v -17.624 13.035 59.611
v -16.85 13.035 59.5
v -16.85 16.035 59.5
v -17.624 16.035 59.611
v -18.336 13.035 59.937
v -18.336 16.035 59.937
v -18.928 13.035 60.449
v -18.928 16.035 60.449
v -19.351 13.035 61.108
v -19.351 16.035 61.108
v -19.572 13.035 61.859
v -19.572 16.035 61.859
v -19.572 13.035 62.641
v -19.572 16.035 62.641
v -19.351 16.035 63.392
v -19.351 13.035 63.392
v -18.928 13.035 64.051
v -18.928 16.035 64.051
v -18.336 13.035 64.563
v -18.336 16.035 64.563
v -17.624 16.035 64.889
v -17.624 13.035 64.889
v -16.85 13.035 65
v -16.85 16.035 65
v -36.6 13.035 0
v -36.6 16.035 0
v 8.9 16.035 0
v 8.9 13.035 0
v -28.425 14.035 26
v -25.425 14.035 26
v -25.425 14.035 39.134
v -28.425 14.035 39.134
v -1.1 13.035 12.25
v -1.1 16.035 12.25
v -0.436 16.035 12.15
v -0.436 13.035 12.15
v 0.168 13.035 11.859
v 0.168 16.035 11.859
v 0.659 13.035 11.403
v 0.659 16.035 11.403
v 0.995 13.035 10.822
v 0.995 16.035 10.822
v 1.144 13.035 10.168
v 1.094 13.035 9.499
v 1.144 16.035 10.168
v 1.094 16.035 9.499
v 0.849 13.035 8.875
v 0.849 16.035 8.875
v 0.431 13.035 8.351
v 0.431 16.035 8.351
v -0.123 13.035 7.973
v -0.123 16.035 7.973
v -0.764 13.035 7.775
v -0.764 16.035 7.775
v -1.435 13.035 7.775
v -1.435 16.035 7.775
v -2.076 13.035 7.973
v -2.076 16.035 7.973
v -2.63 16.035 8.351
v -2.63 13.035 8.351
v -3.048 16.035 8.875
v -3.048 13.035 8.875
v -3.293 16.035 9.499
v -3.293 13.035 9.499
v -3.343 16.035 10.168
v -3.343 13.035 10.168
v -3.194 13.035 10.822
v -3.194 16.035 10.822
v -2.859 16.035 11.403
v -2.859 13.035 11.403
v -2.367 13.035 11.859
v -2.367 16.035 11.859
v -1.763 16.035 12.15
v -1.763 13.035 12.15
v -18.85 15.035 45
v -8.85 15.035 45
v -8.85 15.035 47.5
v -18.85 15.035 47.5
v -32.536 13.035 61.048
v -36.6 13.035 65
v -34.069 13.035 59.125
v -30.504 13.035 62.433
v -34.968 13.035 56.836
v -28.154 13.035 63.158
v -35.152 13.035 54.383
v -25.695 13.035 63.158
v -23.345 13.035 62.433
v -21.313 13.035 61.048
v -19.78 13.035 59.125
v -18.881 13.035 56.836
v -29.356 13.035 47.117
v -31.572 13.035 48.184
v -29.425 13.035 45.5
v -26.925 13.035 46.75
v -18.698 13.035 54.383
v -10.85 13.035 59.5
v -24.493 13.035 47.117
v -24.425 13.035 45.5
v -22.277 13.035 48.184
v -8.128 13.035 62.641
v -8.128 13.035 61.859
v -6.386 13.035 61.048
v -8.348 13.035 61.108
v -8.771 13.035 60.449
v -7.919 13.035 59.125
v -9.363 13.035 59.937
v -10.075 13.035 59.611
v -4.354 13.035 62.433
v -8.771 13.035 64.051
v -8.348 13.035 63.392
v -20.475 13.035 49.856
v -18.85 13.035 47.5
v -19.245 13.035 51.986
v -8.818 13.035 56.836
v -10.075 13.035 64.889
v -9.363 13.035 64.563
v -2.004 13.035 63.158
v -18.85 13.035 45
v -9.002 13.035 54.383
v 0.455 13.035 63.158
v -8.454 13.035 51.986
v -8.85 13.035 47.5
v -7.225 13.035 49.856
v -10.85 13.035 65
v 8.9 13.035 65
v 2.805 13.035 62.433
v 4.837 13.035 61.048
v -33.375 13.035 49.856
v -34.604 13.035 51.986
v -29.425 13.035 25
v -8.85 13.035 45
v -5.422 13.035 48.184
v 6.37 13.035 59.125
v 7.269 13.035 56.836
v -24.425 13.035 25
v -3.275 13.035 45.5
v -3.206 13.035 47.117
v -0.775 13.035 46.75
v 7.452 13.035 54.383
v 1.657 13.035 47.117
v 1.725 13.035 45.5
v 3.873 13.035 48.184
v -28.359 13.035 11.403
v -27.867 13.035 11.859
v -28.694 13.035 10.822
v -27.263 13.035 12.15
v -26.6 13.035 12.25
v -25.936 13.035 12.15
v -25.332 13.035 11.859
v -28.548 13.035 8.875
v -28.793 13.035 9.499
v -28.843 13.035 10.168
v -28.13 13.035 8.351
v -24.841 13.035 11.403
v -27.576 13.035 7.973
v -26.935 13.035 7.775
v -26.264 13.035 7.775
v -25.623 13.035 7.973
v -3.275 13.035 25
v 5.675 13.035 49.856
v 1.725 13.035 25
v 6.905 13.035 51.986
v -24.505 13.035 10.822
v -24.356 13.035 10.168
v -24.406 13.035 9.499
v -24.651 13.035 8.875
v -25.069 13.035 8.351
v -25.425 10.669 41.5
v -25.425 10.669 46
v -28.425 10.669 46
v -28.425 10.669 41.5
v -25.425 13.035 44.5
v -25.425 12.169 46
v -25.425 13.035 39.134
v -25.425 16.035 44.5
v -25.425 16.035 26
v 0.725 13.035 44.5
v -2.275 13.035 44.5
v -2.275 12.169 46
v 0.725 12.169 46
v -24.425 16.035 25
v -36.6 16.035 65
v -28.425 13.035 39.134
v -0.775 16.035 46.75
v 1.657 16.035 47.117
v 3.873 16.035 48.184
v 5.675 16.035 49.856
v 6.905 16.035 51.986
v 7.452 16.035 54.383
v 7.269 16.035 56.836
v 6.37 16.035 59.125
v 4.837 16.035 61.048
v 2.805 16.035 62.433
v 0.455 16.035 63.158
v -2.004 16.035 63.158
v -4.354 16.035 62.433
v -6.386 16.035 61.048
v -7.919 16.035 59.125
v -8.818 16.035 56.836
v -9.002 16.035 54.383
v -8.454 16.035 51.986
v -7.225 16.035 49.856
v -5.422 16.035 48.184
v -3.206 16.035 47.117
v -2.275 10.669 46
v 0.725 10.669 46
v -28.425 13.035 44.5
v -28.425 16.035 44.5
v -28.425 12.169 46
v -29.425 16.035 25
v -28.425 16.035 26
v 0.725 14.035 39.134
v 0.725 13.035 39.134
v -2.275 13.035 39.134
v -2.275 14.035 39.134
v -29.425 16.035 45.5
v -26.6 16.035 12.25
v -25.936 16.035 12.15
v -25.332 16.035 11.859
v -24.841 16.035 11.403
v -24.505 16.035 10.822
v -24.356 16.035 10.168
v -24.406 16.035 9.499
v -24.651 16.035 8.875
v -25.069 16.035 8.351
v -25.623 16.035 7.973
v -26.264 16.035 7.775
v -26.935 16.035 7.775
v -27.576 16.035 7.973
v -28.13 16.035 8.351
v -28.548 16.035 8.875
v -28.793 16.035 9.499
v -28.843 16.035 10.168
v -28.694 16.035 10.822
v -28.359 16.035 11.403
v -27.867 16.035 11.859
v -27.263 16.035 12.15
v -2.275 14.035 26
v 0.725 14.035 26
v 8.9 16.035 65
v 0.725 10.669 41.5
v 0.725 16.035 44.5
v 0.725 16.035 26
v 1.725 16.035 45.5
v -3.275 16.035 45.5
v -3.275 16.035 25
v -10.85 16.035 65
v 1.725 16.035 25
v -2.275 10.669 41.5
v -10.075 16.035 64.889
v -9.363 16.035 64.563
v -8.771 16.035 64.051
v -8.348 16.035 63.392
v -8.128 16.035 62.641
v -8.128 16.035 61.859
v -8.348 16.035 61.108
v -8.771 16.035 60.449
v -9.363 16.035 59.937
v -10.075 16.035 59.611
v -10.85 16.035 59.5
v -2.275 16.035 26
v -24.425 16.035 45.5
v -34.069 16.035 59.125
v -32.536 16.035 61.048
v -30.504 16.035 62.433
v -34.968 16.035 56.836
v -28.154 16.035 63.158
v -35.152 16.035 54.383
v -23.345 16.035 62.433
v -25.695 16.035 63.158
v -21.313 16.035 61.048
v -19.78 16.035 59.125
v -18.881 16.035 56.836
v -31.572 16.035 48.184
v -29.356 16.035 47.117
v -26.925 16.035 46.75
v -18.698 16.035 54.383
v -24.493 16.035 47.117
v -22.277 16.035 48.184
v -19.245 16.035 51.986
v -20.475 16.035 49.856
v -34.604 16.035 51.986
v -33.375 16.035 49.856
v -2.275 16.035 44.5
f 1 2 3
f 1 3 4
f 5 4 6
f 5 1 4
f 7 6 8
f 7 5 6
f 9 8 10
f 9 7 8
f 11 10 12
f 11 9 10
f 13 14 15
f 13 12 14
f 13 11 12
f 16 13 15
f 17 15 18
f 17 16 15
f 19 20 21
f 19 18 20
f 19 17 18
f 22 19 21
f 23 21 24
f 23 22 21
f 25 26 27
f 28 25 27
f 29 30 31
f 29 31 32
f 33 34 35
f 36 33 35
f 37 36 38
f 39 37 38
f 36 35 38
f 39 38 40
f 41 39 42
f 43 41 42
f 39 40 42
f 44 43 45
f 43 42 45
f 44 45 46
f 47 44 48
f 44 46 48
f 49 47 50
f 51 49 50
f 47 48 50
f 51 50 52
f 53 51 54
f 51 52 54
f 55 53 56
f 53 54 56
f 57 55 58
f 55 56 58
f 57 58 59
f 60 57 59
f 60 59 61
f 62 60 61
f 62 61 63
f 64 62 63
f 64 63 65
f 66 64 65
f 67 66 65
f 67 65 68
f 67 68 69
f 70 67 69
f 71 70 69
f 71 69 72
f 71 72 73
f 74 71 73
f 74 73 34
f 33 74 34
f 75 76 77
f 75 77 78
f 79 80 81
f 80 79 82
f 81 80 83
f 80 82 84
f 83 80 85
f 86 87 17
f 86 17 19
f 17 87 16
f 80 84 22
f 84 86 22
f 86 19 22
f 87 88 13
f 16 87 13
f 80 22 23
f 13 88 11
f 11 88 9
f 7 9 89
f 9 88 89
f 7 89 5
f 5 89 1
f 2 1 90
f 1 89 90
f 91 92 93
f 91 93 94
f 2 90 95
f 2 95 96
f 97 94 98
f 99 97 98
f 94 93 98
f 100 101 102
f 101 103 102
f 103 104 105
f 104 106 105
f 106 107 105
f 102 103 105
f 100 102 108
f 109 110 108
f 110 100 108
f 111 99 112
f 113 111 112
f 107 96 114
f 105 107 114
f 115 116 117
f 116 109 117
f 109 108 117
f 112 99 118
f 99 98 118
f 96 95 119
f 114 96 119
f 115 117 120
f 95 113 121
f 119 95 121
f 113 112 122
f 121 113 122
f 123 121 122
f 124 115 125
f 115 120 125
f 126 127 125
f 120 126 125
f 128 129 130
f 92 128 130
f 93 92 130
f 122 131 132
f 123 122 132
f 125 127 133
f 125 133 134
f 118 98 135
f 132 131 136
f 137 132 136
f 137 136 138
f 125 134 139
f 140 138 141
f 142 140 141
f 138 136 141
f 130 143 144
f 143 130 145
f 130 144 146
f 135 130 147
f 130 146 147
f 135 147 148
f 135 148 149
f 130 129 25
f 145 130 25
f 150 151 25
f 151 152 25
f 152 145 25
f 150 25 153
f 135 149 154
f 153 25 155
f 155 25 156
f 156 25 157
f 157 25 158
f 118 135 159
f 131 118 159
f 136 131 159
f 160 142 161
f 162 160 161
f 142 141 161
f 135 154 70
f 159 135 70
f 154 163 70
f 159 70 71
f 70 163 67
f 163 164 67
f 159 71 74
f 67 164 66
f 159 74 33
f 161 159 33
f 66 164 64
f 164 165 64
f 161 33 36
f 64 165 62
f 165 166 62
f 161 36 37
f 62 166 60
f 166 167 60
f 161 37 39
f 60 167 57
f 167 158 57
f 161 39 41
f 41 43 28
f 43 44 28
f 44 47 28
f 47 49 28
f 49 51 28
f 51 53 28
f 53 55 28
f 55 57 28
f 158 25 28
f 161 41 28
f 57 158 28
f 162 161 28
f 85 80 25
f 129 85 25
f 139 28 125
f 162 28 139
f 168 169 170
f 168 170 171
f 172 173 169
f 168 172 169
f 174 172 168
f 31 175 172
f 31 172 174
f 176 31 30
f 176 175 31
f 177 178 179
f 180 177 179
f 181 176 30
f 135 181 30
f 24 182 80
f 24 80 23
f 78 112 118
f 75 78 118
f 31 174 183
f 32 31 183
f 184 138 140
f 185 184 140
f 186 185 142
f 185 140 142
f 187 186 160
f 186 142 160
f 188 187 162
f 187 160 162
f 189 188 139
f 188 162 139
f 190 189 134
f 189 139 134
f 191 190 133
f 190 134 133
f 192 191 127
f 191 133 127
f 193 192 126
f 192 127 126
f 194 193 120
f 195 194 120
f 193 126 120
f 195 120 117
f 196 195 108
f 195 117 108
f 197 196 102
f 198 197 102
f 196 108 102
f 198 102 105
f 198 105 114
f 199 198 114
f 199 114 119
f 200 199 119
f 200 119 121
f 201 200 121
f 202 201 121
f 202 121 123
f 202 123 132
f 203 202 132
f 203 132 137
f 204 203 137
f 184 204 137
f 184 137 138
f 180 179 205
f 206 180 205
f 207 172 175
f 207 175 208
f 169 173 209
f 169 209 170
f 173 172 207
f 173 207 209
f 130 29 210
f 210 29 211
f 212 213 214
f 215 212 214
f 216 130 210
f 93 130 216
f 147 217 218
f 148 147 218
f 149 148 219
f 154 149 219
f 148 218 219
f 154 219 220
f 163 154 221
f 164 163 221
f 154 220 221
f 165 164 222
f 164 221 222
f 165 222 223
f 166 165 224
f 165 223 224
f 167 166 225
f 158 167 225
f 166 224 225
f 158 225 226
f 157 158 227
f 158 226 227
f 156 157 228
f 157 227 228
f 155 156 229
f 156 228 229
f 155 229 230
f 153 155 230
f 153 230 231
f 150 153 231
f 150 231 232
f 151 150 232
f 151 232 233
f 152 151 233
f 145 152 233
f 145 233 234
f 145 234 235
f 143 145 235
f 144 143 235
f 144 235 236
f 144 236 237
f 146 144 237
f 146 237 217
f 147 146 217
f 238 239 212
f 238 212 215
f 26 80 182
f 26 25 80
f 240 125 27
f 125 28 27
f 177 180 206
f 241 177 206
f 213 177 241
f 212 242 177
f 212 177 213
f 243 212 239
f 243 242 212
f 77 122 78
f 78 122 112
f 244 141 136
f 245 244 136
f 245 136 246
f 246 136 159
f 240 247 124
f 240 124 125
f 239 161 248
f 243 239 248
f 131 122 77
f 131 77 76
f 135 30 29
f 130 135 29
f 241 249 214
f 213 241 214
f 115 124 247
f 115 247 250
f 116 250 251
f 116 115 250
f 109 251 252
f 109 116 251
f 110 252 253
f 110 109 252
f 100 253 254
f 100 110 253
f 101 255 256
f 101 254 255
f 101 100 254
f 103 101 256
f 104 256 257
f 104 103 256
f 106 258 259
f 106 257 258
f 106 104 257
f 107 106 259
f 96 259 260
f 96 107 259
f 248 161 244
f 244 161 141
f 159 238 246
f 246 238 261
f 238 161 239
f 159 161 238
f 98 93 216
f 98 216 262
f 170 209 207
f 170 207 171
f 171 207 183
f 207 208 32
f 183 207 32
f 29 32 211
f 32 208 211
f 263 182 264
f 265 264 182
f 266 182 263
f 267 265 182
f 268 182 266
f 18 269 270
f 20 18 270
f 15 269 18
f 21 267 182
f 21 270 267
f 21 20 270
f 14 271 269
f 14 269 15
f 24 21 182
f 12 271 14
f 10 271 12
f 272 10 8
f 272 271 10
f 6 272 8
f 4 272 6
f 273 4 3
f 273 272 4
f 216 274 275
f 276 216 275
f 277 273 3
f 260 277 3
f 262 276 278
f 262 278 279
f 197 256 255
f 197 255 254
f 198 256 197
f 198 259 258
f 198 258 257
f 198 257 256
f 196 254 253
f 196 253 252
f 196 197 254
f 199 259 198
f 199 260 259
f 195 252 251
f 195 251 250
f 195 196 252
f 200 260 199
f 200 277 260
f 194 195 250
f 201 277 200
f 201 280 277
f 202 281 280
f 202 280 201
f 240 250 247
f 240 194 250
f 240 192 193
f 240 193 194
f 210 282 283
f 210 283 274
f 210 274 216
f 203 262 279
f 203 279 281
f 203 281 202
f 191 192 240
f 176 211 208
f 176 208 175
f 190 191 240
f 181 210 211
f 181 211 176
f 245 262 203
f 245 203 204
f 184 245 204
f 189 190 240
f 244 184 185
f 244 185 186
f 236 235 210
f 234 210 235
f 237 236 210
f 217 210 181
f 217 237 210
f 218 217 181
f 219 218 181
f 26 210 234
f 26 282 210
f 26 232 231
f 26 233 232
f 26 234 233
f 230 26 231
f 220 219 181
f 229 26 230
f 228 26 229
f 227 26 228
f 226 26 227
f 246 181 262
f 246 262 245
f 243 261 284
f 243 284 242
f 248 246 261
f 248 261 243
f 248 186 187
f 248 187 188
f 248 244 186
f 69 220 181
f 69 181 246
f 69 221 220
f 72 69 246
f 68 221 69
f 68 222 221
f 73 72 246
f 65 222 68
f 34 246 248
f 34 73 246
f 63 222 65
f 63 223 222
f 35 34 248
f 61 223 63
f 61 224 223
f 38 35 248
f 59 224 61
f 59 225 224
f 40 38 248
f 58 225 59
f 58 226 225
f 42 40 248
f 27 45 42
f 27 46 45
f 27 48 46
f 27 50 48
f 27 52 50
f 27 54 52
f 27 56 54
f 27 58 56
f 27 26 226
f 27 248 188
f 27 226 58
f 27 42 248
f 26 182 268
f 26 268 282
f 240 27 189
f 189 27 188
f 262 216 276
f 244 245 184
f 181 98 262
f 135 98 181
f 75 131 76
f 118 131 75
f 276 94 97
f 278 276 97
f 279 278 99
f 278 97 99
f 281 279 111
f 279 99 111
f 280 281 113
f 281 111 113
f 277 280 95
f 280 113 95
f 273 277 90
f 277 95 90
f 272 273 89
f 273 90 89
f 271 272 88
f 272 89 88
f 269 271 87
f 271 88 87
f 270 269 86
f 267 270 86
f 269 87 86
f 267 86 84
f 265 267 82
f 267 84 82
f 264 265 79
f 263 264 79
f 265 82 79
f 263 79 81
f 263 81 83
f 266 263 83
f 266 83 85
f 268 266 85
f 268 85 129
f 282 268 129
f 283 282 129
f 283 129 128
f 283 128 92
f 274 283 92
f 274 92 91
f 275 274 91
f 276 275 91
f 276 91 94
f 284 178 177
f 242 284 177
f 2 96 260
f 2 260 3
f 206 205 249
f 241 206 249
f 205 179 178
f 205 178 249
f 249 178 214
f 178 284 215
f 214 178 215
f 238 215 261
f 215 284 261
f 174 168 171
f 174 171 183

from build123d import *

# Parameters (mm, degrees)
SKETCH1_W           = 45.5
SKETCH1_H           = 3
BOSS_EXTRUDE1_DEPTH = 20
SKETCH2_W           = 45.5
SKETCH2_H           = 3
BOSS_EXTRUDE2_DEPTH = 45
SKETCH3_R           = 8.25
CUT_EXTRUDE1_DEPTH  = 75.656105932
CUT_EXTRUDE2_DEPTH  = 75.656105932
BOSS_EXTRUDE4_DEPTH = 3
CUT_EXTRUDE3_DEPTH  = 75.656105932
SKETCH10_W          = 10
SKETCH10_H          = 2.5
CUT_EXTRUDE4_DEPTH  = 2
SKETCH13_W          = 3
SKETCH13_H          = 14.133974596
CUT_EXTRUDE6_DEPTH  = 1
CHAMFER1_SIZE       = 1
SKETCH15_R          = 2.25
CUT_EXTRUDE7_DEPTH  = 75.788557826
CHAMFER2_SIZE       = 1


with BuildPart() as part:
    # Sketch1 → Boss-Extrude1 (new body)
    with BuildSketch(Plane.XY):
        with Locations((-13.849646897, 14.534741944)):
            Rectangle(SKETCH1_W, SKETCH1_H)
    extrude(amount=BOSS_EXTRUDE1_DEPTH)

    # Sketch2 → Boss-Extrude2 (add)
    with BuildSketch(Plane.XY.offset(20)):
        with Locations((-13.849646897, 14.534741944)):
            Rectangle(SKETCH2_W, SKETCH2_H)
    extrude(amount=BOSS_EXTRUDE2_DEPTH)

    # Sketch3 → Cut-Extrude1 (cut, through all)
    with BuildSketch(Plane(origin=(0, 13.034741944, 0), x_dir=(-1, 0, 0), z_dir=(0, -1, 0))):
        with Locations(Location((26.924646897, -55, 0), (0, 0, 90))):
            Circle(SKETCH3_R)
        with Locations(Location((0.774646897, -55, 0), (0, 0, 90))):
            Circle(SKETCH3_R)
    extrude(amount=-CUT_EXTRUDE1_DEPTH, mode=Mode.SUBTRACT)

    # Sketch5 → Cut-Extrude2 (cut, through all)
    with BuildSketch(Plane(origin=(0, 13.034741944, 0), x_dir=(-1, 0, 0), z_dir=(0, -1, 0))):
        Polygon((29.424646897, -25), (29.424646897, -45.5), (24.424646897, -45.5), (24.424646897, -25), (25.424646897, -25), (25.424646897, -44.5), (28.424646897, -44.5), (28.424646897, -25), align=None)
        Polygon((-0.725353103, -25), (-1.725353103, -25), (-1.725353103, -45.5), (3.274646897, -45.5), (3.274646897, -25), (2.274646897, -25), (2.274646897, -44.5), (-0.725353103, -44.5), align=None)
    extrude(amount=-CUT_EXTRUDE2_DEPTH, mode=Mode.SUBTRACT)

    # Sketch6 → Boss-Extrude4 (add)
    with BuildSketch(Plane(origin=(-25.424646897, 0, 0), x_dir=(0, 0, -1), z_dir=(1, 0, 0))):
        Polygon((-44.5, 13.034741944), (-46, 12.16871654), (-46, 10.66871654), (-41.5, 10.66871654), (-39.133974596, 13.034741944), align=None)
    boss_extrude4 = extrude(amount=-BOSS_EXTRUDE4_DEPTH)

    # Mirror7: Boss-Extrude4 across plane
    add(boss_extrude4.mirror(Plane(origin=(-13.849646897, 13.034741944, 25), x_dir=(0, 0, 1), z_dir=(1, 0, 0))))

    # Sketch9 → Cut-Extrude3 (cut, through all)
    with BuildSketch(Plane(origin=(0, 13.034741944, 0), x_dir=(-1, 0, 0), z_dir=(0, -1, 0))):
        with BuildLine():
            Line((16.849646897, -65), (10.849646897, -65))
            ThreePointArc((10.849646897, -65), (8.099646897, -62.25), (10.849646897, -59.5))
            Line((10.849646897, -59.5), (16.849646897, -59.5))
            ThreePointArc((16.849646897, -59.5), (19.599646897, -62.25), (16.849646897, -65))
        make_face()
    extrude(amount=-CUT_EXTRUDE3_DEPTH, mode=Mode.SUBTRACT)

    # Sketch10 → Cut-Extrude4 (cut)
    with BuildSketch(Plane(origin=(0, 13.034741944, 0), x_dir=(-1, 0, 0), z_dir=(0, -1, 0))):
        with Locations((13.849646897, -46.25)):
            Rectangle(SKETCH10_W, SKETCH10_H)
    extrude(amount=-CUT_EXTRUDE4_DEPTH, mode=Mode.SUBTRACT)

    # Sketch13 → Cut-Extrude6 (cut)
    with BuildSketch(Plane(origin=(0, 13.034741944, 0), x_dir=(-1, 0, 0), z_dir=(0, -1, 0))):
        with Locations((26.924646897, -32.066987298)):
            Rectangle(SKETCH13_W, SKETCH13_H)
        with Locations((0.774646897, -32.066987298)):
            Rectangle(SKETCH13_W, SKETCH13_H)
    extrude(amount=-CUT_EXTRUDE6_DEPTH, mode=Mode.SUBTRACT)

    # Chamfer1
    chamfer1_edges = [part.edges().sort_by_distance(p)[0] for p in [
        (-26.924646897, 14.034741944, 25),
        (-0.774646897, 14.034741944, 25),
    ]]
    chamfer(chamfer1_edges, length=CHAMFER1_SIZE - 0.0001)  # a hair under: the kernel refuses the full size

    # Sketch15 → Cut-Extrude7 (cut, through all)
    with BuildSketch(Plane(origin=(0, 16.034741944, 0), x_dir=(1, 0, 0), z_dir=(0, 1, 0))):
        with Locations(Location((-26.599646897, -10, 0), (0, 0, 270))):
            Circle(SKETCH15_R)
        with Locations(Location((-1.099646897, -10, 0), (0, 0, 270))):
            Circle(SKETCH15_R)
    extrude(amount=-CUT_EXTRUDE7_DEPTH, mode=Mode.SUBTRACT)

    # Chamfer2
    chamfer2_edges = [part.edges().sort_by_distance(p)[0] for p in [
        (-28.424646897, 14.534791944, 25),
        (-25.424646897, 14.534791944, 25),
        (0.725353103, 14.534791944, 25),
        (-2.274646897, 14.534791944, 25),
    ]]
    chamfer(chamfer2_edges, length=CHAMFER2_SIZE - 0.0001)  # a hair under: the kernel refuses the full size


solid = part.part
